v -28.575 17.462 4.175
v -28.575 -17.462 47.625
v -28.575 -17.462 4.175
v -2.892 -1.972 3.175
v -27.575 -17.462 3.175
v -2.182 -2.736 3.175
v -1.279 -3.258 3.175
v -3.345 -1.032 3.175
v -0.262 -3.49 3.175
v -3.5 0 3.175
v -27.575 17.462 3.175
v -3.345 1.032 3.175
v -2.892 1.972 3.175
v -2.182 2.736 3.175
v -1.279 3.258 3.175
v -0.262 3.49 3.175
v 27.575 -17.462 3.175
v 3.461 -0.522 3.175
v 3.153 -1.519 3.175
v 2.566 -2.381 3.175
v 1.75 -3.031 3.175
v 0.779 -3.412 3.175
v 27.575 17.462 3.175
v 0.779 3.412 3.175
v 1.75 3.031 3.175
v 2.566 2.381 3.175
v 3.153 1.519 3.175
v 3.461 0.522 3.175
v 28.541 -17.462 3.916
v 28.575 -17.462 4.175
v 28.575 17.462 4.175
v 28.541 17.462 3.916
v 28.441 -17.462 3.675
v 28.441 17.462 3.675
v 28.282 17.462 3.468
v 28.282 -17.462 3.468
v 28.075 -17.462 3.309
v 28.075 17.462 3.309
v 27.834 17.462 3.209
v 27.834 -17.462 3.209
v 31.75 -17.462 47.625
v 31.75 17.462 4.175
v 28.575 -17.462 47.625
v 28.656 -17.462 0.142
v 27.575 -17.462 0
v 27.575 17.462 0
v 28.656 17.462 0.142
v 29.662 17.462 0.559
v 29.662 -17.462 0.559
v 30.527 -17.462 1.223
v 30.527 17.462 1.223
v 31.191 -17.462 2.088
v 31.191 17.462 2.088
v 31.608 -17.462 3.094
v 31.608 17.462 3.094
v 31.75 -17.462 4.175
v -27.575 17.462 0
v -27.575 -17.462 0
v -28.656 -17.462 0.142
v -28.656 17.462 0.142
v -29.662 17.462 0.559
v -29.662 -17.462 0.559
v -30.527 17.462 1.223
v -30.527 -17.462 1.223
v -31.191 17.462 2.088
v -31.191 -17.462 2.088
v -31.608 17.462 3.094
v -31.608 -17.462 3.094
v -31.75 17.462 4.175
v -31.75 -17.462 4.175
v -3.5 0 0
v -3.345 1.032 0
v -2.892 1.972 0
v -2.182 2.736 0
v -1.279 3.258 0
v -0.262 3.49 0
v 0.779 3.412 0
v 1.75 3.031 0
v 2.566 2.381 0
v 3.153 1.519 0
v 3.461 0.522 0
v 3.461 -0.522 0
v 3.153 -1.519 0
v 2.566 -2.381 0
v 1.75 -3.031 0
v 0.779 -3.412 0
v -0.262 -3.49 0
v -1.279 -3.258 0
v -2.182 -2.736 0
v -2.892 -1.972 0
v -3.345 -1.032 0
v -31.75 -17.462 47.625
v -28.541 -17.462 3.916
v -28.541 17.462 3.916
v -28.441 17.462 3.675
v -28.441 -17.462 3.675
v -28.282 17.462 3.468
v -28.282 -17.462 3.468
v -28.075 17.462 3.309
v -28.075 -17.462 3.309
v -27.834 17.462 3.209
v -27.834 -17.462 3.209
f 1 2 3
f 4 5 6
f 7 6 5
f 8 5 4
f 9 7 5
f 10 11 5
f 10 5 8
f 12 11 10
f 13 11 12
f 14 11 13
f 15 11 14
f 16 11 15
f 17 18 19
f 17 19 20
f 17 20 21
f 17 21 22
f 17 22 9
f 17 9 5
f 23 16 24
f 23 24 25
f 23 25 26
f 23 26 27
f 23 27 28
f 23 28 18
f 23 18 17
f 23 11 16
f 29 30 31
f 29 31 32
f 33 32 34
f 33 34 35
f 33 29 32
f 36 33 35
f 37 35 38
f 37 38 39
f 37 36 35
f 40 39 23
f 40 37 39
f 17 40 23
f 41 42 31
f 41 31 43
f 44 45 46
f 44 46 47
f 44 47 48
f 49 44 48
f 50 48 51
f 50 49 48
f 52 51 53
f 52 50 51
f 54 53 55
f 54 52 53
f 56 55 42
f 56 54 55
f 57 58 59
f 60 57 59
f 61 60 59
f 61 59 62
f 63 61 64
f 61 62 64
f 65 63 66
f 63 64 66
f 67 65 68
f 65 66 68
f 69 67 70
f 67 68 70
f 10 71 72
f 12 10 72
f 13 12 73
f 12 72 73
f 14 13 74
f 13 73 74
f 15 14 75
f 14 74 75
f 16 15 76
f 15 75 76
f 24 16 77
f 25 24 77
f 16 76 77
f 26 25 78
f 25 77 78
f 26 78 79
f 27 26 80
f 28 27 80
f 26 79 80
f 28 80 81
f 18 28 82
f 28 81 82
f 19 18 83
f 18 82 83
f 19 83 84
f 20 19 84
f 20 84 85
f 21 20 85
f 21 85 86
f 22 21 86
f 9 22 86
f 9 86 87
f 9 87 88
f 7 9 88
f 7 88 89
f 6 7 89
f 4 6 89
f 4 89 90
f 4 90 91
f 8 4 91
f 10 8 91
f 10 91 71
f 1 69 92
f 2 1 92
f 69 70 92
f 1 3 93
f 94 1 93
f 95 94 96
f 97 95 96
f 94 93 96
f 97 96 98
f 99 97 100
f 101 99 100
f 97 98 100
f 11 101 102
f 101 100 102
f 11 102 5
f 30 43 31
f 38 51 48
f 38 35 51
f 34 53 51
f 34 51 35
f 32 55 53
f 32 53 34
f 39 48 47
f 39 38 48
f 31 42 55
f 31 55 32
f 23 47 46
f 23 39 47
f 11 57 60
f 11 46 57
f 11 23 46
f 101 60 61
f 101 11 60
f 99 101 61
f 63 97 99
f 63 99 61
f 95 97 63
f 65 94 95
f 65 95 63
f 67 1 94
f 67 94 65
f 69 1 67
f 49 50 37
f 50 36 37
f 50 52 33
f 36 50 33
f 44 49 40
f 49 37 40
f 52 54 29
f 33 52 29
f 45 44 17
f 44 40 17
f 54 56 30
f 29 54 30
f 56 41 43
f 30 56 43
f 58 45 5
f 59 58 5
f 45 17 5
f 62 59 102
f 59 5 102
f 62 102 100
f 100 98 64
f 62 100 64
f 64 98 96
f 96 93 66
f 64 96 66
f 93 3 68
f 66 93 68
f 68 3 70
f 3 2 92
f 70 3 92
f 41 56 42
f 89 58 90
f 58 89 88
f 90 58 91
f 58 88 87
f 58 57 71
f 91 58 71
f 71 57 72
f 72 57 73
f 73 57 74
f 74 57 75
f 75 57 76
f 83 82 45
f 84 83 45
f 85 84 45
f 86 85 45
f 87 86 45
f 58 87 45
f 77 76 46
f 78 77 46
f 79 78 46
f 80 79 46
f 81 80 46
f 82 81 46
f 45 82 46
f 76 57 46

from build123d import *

# Parameters (mm, degrees)
SKETCH2_W                    = 57.15
SKETCH2_H                    = 34.925
BASE_FLANGE1_DEPTH           = 3.175
EDGE_FLANGE1_STRIP_W         = 14.7
EDGE_FLANGE1_STRIP_H         = 3.175
EDGE_FLANGE1_STRIP_CUT_DEPTH = 34.925
EDGE_FLANGE1_DEPTH           = 34.925
CUT_EXTRUDE1_DEPTH           = 3.175
M6_CLEARANCE_HOLE1_D         = 7


# Sheet-metal steps are written as plain solids
with BuildPart() as part:
    # Sketch2 → Base-Flange1 (new body)
    with BuildSketch(Plane.XY):
        Rectangle(SKETCH2_W, SKETCH2_H)
    extrude(amount=BASE_FLANGE1_DEPTH)

    # Edge-Flange1 strip (across the edge) → Edge-Flange1 strip cut (cut)
    with BuildSketch(Plane(origin=(28.575, -17.4625, 3.175), x_dir=(-1, 0, 0), z_dir=(0, 1, 0))):
        with Locations((-6.35, -1.5875)):
            Rectangle(EDGE_FLANGE1_STRIP_W, EDGE_FLANGE1_STRIP_H)
    edge_flange1_strip_cut = extrude(amount=EDGE_FLANGE1_STRIP_CUT_DEPTH, mode=Mode.SUBTRACT)

    # Edge-Flange1 section (across the edge) → Edge-Flange1 (add)
    with BuildSketch(Plane(origin=(28.575, -17.4625, 3.175), x_dir=(-1, 0, 0), z_dir=(0, 1, 0))):
        with BuildLine():
            Line((-3.175, 1), (-3.175, 44.45))
            Line((-3.175, 44.45), (0, 44.45))
            Line((0, 44.45), (0, 1))
            ThreePointArc((0, 1), (0.292893219, 0.292893219), (1, 0))
            Line((1, 0), (1, -3.175))
            ThreePointArc((1, -3.175), (-1.952170811, -1.952170811), (-3.175, 1))
        make_face()
    edge_flange1 = extrude(amount=EDGE_FLANGE1_DEPTH)

    # Sketch10 → Cut-Extrude1 (cut)
    with BuildSketch(Plane(origin=(31.75, 0, 0), x_dir=(0, 0, -1), z_dir=(1, 0, 0))):
        Polygon((-4.175, 17.4625), (-47.625, -17.4625), (-47.625, 17.4625), align=None)
    cut_extrude1 = extrude(amount=-CUT_EXTRUDE1_DEPTH, mode=Mode.SUBTRACT)

    # Mirror1: Edge-Flange1 strip cut, Edge-Flange1, Cut-Extrude1 across plane
    add(edge_flange1_strip_cut.mirror(Plane(origin=(0, 0, 0), x_dir=(0, 0, 1), z_dir=(1, 0, 0))), mode=Mode.SUBTRACT)
    add(edge_flange1.mirror(Plane(origin=(0, 0, 0), x_dir=(0, 0, 1), z_dir=(1, 0, 0))))
    add(cut_extrude1.mirror(Plane(origin=(0, 0, 0), x_dir=(0, 0, 1), z_dir=(1, 0, 0))), mode=Mode.SUBTRACT)

    # M6 Clearance Hole1 (through all)
    with Locations(Plane.XY.offset(3.175)):
        with Locations((0, 0)):
            Hole(M6_CLEARANCE_HOLE1_D / 2)


solid = part.part
